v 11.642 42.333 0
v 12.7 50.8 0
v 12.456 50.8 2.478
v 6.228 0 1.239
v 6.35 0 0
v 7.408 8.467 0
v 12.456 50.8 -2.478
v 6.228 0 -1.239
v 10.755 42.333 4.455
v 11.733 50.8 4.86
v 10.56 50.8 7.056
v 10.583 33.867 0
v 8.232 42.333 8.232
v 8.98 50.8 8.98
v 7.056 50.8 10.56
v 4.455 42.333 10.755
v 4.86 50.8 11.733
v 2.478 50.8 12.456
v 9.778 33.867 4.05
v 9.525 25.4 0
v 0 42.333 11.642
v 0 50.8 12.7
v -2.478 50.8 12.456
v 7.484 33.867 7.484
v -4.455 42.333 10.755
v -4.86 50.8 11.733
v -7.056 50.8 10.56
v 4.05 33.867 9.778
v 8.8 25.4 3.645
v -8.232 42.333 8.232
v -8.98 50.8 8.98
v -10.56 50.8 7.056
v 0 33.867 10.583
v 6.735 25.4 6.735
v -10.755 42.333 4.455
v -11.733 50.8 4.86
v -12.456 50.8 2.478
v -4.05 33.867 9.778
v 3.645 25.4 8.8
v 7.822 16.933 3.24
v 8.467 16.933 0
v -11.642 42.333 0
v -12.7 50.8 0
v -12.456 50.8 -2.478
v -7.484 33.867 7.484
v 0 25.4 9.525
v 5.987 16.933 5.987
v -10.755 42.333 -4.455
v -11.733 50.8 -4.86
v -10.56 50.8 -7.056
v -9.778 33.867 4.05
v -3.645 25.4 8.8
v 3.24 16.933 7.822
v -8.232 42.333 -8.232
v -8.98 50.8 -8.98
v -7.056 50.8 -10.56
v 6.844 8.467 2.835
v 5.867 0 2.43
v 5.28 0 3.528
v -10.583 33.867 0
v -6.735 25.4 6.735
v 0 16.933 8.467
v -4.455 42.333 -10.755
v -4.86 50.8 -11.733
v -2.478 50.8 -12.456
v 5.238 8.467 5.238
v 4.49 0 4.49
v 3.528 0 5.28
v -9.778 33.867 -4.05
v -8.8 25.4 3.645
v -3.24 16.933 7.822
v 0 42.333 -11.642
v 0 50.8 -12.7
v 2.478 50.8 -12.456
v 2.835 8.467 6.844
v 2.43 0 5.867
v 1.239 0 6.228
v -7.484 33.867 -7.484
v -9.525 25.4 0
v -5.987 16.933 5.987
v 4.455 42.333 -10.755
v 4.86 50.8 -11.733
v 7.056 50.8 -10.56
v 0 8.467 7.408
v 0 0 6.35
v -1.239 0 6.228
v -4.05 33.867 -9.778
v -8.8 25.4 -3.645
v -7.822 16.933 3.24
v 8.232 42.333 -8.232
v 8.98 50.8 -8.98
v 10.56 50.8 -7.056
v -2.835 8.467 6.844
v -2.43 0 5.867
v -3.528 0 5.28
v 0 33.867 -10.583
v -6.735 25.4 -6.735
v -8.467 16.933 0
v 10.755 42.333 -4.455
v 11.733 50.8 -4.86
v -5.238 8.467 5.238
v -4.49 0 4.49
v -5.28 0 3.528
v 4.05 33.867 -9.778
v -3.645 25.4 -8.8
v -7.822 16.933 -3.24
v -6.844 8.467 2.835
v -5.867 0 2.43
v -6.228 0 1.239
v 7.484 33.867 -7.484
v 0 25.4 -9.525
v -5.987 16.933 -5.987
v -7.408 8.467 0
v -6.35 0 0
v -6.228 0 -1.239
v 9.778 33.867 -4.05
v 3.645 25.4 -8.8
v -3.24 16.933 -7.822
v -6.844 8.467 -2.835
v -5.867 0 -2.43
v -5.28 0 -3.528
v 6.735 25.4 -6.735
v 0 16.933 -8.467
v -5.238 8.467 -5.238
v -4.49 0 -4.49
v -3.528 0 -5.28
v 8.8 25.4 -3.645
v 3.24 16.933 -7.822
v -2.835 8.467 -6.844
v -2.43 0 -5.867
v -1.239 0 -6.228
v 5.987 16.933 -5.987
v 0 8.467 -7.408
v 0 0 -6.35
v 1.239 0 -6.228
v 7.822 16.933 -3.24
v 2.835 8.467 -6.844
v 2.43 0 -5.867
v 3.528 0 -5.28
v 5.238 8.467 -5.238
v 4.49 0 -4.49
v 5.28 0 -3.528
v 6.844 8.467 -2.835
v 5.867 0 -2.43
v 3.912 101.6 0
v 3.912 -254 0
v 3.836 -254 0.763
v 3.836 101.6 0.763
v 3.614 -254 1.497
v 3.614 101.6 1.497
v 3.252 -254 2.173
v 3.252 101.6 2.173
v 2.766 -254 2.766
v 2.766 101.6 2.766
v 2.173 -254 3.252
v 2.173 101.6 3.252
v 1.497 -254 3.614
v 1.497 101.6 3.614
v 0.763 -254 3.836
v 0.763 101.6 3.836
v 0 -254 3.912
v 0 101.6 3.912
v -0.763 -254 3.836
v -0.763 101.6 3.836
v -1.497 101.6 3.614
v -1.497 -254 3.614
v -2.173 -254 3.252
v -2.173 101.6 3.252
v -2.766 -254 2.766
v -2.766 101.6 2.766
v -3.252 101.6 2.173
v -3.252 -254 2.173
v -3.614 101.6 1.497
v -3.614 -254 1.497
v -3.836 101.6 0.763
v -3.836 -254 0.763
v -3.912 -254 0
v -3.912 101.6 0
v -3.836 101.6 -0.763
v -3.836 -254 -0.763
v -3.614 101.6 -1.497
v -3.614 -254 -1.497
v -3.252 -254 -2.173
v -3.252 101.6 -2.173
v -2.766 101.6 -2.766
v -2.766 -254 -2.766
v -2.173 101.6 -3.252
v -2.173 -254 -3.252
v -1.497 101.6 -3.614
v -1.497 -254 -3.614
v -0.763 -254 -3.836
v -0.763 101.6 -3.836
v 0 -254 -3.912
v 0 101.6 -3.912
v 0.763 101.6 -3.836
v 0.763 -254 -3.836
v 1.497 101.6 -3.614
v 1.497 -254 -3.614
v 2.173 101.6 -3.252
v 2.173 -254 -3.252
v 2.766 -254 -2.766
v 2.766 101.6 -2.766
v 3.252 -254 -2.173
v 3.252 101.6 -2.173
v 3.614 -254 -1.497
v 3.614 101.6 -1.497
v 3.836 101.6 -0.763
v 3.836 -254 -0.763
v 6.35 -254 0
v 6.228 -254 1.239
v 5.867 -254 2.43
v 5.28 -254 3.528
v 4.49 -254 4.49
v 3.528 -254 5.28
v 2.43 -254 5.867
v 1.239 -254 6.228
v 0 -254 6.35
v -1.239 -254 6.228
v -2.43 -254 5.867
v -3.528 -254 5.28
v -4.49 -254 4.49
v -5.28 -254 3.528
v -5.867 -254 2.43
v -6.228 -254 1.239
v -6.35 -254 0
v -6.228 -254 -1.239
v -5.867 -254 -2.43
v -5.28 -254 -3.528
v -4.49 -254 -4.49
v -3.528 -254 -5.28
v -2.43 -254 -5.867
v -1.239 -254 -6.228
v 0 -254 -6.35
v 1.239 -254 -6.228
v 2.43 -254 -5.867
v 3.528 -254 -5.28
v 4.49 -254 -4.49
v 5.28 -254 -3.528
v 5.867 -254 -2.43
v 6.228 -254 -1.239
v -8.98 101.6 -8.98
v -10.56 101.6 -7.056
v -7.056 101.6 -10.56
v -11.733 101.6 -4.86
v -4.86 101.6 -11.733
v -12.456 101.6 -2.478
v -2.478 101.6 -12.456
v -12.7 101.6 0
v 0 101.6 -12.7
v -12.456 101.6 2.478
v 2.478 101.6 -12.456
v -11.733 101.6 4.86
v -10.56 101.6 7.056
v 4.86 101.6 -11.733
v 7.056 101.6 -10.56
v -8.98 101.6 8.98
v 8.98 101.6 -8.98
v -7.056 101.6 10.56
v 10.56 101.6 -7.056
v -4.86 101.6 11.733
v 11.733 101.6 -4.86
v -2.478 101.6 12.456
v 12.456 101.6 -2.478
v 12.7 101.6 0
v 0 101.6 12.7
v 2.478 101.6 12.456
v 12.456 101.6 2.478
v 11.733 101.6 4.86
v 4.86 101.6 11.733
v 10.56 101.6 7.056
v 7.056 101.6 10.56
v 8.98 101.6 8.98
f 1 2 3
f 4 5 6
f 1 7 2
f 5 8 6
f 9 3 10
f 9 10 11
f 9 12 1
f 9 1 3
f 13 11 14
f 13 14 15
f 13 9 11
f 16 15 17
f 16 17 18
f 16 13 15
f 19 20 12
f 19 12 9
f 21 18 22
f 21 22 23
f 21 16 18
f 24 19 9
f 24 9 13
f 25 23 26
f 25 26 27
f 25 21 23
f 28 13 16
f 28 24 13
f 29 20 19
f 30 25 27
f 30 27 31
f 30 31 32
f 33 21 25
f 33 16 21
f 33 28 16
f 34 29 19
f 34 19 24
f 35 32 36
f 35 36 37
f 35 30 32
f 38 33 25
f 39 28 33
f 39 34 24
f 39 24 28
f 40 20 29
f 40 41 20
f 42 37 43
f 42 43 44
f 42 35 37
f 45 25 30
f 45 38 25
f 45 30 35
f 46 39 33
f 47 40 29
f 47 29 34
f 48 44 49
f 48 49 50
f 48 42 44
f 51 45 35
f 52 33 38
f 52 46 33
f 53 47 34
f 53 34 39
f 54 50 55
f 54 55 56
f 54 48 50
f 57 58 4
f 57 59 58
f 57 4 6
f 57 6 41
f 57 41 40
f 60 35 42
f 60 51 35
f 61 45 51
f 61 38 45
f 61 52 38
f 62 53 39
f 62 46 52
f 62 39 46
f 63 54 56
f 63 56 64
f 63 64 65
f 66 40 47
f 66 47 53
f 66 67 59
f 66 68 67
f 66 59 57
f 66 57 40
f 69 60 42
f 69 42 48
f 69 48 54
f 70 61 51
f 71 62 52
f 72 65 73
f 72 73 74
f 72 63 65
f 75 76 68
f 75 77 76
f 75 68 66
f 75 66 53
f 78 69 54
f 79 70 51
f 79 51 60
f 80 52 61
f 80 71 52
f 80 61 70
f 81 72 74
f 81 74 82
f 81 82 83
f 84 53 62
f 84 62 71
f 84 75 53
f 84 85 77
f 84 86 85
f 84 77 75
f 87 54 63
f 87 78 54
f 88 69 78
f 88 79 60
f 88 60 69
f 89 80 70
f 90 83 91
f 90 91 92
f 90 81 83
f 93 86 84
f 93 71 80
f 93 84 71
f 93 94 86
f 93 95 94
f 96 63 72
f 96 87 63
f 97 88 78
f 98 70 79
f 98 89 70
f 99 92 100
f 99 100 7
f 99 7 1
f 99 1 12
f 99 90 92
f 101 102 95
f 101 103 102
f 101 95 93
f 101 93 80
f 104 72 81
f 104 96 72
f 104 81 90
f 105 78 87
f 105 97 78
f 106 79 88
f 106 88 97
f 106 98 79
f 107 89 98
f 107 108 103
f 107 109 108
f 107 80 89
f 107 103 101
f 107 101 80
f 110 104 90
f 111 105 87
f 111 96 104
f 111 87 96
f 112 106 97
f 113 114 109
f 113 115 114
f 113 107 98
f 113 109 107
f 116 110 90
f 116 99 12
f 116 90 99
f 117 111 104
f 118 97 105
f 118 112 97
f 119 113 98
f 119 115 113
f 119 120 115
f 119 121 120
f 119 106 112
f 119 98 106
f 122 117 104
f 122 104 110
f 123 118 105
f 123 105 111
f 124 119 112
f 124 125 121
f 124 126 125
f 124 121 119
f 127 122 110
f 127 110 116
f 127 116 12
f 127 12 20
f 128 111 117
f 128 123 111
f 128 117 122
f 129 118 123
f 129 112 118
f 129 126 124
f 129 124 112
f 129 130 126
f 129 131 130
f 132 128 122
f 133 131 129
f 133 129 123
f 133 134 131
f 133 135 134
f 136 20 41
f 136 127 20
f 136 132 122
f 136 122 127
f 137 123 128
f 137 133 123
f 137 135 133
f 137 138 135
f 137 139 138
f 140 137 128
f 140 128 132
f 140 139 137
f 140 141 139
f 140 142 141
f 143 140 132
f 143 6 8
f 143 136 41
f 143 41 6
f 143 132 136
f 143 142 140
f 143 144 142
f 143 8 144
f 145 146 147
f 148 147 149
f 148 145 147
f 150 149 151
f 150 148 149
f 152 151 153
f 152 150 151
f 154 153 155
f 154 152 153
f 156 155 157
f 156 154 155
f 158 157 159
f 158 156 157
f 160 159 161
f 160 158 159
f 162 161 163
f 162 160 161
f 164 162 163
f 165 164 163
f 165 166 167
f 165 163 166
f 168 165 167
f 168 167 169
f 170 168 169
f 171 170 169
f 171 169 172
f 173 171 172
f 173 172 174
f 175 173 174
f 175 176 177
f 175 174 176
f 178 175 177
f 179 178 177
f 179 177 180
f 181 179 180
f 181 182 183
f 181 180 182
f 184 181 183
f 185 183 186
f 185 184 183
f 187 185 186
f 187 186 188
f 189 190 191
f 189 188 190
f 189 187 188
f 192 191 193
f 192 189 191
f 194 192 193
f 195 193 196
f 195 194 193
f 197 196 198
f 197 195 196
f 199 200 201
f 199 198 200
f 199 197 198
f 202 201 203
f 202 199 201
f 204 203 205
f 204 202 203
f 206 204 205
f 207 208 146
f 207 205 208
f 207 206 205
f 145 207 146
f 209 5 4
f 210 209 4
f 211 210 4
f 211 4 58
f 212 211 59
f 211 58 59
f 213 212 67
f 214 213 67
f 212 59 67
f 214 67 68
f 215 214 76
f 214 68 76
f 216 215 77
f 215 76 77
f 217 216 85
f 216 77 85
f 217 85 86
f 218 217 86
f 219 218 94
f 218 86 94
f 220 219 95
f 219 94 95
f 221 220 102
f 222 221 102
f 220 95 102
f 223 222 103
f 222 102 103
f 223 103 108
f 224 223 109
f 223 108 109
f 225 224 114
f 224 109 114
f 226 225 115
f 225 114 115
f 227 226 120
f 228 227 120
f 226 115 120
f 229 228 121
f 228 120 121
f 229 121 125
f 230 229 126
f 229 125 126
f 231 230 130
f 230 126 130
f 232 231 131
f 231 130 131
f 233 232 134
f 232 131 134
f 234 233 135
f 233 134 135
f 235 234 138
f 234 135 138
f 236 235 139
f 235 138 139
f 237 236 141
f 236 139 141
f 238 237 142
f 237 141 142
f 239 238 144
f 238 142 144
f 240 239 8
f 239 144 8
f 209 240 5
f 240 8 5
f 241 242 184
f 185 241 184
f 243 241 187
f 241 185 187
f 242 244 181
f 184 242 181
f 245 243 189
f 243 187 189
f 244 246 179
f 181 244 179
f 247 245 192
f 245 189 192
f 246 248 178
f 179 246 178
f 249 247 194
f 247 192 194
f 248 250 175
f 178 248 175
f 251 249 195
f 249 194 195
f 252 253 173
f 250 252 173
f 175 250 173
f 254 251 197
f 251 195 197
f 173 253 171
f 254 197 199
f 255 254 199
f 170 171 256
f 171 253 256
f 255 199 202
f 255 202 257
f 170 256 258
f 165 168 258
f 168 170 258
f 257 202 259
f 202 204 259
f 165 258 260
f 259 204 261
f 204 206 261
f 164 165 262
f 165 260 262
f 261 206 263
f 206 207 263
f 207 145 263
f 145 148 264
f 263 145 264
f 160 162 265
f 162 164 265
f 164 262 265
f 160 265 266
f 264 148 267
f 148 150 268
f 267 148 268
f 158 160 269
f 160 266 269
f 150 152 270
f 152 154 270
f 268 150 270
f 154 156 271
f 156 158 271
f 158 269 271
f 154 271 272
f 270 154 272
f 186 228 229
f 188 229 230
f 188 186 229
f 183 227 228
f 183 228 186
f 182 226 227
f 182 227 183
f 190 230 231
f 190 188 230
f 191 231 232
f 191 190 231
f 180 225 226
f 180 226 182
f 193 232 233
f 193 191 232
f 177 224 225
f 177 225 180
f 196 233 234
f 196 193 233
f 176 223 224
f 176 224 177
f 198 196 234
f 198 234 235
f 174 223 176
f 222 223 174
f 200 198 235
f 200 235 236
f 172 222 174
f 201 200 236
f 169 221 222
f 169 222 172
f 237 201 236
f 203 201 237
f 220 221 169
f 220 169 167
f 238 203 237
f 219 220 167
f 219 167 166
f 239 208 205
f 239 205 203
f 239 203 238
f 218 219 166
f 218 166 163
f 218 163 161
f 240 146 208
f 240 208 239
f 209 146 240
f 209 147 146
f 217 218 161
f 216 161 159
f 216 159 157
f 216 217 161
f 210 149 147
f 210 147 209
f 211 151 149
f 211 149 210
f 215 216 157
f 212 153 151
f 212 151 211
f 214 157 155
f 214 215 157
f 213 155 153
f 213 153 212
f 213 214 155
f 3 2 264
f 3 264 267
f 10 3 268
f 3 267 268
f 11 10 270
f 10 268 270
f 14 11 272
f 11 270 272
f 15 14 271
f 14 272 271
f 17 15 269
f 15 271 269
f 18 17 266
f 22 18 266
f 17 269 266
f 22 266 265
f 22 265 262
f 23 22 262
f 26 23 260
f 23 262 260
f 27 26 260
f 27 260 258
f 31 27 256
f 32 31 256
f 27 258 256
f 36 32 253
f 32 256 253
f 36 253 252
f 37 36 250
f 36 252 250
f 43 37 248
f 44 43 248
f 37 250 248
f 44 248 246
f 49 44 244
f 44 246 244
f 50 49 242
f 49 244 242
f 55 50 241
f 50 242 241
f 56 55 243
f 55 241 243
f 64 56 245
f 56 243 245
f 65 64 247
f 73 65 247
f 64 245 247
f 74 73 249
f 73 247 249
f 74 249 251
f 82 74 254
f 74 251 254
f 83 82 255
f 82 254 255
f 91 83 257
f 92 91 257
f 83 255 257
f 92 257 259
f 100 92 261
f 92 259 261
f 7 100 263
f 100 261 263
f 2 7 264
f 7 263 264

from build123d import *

# Parameters (mm, degrees)
F0_R     = 6.35
F1_DEPTH = 254
F5_R     = 12.7
F6_DEPTH = 50.8
F4_R     = 12.7
F8_R     = 3.9116
F9_DEPTH = 406.4


with BuildPart() as f1:
    # F0 (on Front) → F1 (new body)
    with BuildSketch(Plane.XZ):
        Circle(F0_R)
    extrude(amount=F1_DEPTH)



with BuildPart() as f6:
    # F5 (on offset) → F6 (new body)
    with BuildSketch(Plane.XZ.offset(-101.6)):
        Circle(F5_R)
    extrude(amount=F6_DEPTH)


with BuildPart() as f1_1:
    add(f1.part)

    add(f6.part)  # F7 merges F6
    # F4 (on offset) → F7 section 0
    with BuildSketch(Plane.XZ.offset(-50.8)):
        Circle(F4_R)
    # F0 (on Front) → F7 section 1
    with BuildSketch(Plane.XZ):
        Circle(F0_R)
    loft()

    # F8 (on face) → F9 (cut)
    with BuildSketch(Plane.XZ.offset(-101.6)):
        Circle(F8_R)
    extrude(amount=F9_DEPTH, mode=Mode.SUBTRACT)


solid = f1_1.part
